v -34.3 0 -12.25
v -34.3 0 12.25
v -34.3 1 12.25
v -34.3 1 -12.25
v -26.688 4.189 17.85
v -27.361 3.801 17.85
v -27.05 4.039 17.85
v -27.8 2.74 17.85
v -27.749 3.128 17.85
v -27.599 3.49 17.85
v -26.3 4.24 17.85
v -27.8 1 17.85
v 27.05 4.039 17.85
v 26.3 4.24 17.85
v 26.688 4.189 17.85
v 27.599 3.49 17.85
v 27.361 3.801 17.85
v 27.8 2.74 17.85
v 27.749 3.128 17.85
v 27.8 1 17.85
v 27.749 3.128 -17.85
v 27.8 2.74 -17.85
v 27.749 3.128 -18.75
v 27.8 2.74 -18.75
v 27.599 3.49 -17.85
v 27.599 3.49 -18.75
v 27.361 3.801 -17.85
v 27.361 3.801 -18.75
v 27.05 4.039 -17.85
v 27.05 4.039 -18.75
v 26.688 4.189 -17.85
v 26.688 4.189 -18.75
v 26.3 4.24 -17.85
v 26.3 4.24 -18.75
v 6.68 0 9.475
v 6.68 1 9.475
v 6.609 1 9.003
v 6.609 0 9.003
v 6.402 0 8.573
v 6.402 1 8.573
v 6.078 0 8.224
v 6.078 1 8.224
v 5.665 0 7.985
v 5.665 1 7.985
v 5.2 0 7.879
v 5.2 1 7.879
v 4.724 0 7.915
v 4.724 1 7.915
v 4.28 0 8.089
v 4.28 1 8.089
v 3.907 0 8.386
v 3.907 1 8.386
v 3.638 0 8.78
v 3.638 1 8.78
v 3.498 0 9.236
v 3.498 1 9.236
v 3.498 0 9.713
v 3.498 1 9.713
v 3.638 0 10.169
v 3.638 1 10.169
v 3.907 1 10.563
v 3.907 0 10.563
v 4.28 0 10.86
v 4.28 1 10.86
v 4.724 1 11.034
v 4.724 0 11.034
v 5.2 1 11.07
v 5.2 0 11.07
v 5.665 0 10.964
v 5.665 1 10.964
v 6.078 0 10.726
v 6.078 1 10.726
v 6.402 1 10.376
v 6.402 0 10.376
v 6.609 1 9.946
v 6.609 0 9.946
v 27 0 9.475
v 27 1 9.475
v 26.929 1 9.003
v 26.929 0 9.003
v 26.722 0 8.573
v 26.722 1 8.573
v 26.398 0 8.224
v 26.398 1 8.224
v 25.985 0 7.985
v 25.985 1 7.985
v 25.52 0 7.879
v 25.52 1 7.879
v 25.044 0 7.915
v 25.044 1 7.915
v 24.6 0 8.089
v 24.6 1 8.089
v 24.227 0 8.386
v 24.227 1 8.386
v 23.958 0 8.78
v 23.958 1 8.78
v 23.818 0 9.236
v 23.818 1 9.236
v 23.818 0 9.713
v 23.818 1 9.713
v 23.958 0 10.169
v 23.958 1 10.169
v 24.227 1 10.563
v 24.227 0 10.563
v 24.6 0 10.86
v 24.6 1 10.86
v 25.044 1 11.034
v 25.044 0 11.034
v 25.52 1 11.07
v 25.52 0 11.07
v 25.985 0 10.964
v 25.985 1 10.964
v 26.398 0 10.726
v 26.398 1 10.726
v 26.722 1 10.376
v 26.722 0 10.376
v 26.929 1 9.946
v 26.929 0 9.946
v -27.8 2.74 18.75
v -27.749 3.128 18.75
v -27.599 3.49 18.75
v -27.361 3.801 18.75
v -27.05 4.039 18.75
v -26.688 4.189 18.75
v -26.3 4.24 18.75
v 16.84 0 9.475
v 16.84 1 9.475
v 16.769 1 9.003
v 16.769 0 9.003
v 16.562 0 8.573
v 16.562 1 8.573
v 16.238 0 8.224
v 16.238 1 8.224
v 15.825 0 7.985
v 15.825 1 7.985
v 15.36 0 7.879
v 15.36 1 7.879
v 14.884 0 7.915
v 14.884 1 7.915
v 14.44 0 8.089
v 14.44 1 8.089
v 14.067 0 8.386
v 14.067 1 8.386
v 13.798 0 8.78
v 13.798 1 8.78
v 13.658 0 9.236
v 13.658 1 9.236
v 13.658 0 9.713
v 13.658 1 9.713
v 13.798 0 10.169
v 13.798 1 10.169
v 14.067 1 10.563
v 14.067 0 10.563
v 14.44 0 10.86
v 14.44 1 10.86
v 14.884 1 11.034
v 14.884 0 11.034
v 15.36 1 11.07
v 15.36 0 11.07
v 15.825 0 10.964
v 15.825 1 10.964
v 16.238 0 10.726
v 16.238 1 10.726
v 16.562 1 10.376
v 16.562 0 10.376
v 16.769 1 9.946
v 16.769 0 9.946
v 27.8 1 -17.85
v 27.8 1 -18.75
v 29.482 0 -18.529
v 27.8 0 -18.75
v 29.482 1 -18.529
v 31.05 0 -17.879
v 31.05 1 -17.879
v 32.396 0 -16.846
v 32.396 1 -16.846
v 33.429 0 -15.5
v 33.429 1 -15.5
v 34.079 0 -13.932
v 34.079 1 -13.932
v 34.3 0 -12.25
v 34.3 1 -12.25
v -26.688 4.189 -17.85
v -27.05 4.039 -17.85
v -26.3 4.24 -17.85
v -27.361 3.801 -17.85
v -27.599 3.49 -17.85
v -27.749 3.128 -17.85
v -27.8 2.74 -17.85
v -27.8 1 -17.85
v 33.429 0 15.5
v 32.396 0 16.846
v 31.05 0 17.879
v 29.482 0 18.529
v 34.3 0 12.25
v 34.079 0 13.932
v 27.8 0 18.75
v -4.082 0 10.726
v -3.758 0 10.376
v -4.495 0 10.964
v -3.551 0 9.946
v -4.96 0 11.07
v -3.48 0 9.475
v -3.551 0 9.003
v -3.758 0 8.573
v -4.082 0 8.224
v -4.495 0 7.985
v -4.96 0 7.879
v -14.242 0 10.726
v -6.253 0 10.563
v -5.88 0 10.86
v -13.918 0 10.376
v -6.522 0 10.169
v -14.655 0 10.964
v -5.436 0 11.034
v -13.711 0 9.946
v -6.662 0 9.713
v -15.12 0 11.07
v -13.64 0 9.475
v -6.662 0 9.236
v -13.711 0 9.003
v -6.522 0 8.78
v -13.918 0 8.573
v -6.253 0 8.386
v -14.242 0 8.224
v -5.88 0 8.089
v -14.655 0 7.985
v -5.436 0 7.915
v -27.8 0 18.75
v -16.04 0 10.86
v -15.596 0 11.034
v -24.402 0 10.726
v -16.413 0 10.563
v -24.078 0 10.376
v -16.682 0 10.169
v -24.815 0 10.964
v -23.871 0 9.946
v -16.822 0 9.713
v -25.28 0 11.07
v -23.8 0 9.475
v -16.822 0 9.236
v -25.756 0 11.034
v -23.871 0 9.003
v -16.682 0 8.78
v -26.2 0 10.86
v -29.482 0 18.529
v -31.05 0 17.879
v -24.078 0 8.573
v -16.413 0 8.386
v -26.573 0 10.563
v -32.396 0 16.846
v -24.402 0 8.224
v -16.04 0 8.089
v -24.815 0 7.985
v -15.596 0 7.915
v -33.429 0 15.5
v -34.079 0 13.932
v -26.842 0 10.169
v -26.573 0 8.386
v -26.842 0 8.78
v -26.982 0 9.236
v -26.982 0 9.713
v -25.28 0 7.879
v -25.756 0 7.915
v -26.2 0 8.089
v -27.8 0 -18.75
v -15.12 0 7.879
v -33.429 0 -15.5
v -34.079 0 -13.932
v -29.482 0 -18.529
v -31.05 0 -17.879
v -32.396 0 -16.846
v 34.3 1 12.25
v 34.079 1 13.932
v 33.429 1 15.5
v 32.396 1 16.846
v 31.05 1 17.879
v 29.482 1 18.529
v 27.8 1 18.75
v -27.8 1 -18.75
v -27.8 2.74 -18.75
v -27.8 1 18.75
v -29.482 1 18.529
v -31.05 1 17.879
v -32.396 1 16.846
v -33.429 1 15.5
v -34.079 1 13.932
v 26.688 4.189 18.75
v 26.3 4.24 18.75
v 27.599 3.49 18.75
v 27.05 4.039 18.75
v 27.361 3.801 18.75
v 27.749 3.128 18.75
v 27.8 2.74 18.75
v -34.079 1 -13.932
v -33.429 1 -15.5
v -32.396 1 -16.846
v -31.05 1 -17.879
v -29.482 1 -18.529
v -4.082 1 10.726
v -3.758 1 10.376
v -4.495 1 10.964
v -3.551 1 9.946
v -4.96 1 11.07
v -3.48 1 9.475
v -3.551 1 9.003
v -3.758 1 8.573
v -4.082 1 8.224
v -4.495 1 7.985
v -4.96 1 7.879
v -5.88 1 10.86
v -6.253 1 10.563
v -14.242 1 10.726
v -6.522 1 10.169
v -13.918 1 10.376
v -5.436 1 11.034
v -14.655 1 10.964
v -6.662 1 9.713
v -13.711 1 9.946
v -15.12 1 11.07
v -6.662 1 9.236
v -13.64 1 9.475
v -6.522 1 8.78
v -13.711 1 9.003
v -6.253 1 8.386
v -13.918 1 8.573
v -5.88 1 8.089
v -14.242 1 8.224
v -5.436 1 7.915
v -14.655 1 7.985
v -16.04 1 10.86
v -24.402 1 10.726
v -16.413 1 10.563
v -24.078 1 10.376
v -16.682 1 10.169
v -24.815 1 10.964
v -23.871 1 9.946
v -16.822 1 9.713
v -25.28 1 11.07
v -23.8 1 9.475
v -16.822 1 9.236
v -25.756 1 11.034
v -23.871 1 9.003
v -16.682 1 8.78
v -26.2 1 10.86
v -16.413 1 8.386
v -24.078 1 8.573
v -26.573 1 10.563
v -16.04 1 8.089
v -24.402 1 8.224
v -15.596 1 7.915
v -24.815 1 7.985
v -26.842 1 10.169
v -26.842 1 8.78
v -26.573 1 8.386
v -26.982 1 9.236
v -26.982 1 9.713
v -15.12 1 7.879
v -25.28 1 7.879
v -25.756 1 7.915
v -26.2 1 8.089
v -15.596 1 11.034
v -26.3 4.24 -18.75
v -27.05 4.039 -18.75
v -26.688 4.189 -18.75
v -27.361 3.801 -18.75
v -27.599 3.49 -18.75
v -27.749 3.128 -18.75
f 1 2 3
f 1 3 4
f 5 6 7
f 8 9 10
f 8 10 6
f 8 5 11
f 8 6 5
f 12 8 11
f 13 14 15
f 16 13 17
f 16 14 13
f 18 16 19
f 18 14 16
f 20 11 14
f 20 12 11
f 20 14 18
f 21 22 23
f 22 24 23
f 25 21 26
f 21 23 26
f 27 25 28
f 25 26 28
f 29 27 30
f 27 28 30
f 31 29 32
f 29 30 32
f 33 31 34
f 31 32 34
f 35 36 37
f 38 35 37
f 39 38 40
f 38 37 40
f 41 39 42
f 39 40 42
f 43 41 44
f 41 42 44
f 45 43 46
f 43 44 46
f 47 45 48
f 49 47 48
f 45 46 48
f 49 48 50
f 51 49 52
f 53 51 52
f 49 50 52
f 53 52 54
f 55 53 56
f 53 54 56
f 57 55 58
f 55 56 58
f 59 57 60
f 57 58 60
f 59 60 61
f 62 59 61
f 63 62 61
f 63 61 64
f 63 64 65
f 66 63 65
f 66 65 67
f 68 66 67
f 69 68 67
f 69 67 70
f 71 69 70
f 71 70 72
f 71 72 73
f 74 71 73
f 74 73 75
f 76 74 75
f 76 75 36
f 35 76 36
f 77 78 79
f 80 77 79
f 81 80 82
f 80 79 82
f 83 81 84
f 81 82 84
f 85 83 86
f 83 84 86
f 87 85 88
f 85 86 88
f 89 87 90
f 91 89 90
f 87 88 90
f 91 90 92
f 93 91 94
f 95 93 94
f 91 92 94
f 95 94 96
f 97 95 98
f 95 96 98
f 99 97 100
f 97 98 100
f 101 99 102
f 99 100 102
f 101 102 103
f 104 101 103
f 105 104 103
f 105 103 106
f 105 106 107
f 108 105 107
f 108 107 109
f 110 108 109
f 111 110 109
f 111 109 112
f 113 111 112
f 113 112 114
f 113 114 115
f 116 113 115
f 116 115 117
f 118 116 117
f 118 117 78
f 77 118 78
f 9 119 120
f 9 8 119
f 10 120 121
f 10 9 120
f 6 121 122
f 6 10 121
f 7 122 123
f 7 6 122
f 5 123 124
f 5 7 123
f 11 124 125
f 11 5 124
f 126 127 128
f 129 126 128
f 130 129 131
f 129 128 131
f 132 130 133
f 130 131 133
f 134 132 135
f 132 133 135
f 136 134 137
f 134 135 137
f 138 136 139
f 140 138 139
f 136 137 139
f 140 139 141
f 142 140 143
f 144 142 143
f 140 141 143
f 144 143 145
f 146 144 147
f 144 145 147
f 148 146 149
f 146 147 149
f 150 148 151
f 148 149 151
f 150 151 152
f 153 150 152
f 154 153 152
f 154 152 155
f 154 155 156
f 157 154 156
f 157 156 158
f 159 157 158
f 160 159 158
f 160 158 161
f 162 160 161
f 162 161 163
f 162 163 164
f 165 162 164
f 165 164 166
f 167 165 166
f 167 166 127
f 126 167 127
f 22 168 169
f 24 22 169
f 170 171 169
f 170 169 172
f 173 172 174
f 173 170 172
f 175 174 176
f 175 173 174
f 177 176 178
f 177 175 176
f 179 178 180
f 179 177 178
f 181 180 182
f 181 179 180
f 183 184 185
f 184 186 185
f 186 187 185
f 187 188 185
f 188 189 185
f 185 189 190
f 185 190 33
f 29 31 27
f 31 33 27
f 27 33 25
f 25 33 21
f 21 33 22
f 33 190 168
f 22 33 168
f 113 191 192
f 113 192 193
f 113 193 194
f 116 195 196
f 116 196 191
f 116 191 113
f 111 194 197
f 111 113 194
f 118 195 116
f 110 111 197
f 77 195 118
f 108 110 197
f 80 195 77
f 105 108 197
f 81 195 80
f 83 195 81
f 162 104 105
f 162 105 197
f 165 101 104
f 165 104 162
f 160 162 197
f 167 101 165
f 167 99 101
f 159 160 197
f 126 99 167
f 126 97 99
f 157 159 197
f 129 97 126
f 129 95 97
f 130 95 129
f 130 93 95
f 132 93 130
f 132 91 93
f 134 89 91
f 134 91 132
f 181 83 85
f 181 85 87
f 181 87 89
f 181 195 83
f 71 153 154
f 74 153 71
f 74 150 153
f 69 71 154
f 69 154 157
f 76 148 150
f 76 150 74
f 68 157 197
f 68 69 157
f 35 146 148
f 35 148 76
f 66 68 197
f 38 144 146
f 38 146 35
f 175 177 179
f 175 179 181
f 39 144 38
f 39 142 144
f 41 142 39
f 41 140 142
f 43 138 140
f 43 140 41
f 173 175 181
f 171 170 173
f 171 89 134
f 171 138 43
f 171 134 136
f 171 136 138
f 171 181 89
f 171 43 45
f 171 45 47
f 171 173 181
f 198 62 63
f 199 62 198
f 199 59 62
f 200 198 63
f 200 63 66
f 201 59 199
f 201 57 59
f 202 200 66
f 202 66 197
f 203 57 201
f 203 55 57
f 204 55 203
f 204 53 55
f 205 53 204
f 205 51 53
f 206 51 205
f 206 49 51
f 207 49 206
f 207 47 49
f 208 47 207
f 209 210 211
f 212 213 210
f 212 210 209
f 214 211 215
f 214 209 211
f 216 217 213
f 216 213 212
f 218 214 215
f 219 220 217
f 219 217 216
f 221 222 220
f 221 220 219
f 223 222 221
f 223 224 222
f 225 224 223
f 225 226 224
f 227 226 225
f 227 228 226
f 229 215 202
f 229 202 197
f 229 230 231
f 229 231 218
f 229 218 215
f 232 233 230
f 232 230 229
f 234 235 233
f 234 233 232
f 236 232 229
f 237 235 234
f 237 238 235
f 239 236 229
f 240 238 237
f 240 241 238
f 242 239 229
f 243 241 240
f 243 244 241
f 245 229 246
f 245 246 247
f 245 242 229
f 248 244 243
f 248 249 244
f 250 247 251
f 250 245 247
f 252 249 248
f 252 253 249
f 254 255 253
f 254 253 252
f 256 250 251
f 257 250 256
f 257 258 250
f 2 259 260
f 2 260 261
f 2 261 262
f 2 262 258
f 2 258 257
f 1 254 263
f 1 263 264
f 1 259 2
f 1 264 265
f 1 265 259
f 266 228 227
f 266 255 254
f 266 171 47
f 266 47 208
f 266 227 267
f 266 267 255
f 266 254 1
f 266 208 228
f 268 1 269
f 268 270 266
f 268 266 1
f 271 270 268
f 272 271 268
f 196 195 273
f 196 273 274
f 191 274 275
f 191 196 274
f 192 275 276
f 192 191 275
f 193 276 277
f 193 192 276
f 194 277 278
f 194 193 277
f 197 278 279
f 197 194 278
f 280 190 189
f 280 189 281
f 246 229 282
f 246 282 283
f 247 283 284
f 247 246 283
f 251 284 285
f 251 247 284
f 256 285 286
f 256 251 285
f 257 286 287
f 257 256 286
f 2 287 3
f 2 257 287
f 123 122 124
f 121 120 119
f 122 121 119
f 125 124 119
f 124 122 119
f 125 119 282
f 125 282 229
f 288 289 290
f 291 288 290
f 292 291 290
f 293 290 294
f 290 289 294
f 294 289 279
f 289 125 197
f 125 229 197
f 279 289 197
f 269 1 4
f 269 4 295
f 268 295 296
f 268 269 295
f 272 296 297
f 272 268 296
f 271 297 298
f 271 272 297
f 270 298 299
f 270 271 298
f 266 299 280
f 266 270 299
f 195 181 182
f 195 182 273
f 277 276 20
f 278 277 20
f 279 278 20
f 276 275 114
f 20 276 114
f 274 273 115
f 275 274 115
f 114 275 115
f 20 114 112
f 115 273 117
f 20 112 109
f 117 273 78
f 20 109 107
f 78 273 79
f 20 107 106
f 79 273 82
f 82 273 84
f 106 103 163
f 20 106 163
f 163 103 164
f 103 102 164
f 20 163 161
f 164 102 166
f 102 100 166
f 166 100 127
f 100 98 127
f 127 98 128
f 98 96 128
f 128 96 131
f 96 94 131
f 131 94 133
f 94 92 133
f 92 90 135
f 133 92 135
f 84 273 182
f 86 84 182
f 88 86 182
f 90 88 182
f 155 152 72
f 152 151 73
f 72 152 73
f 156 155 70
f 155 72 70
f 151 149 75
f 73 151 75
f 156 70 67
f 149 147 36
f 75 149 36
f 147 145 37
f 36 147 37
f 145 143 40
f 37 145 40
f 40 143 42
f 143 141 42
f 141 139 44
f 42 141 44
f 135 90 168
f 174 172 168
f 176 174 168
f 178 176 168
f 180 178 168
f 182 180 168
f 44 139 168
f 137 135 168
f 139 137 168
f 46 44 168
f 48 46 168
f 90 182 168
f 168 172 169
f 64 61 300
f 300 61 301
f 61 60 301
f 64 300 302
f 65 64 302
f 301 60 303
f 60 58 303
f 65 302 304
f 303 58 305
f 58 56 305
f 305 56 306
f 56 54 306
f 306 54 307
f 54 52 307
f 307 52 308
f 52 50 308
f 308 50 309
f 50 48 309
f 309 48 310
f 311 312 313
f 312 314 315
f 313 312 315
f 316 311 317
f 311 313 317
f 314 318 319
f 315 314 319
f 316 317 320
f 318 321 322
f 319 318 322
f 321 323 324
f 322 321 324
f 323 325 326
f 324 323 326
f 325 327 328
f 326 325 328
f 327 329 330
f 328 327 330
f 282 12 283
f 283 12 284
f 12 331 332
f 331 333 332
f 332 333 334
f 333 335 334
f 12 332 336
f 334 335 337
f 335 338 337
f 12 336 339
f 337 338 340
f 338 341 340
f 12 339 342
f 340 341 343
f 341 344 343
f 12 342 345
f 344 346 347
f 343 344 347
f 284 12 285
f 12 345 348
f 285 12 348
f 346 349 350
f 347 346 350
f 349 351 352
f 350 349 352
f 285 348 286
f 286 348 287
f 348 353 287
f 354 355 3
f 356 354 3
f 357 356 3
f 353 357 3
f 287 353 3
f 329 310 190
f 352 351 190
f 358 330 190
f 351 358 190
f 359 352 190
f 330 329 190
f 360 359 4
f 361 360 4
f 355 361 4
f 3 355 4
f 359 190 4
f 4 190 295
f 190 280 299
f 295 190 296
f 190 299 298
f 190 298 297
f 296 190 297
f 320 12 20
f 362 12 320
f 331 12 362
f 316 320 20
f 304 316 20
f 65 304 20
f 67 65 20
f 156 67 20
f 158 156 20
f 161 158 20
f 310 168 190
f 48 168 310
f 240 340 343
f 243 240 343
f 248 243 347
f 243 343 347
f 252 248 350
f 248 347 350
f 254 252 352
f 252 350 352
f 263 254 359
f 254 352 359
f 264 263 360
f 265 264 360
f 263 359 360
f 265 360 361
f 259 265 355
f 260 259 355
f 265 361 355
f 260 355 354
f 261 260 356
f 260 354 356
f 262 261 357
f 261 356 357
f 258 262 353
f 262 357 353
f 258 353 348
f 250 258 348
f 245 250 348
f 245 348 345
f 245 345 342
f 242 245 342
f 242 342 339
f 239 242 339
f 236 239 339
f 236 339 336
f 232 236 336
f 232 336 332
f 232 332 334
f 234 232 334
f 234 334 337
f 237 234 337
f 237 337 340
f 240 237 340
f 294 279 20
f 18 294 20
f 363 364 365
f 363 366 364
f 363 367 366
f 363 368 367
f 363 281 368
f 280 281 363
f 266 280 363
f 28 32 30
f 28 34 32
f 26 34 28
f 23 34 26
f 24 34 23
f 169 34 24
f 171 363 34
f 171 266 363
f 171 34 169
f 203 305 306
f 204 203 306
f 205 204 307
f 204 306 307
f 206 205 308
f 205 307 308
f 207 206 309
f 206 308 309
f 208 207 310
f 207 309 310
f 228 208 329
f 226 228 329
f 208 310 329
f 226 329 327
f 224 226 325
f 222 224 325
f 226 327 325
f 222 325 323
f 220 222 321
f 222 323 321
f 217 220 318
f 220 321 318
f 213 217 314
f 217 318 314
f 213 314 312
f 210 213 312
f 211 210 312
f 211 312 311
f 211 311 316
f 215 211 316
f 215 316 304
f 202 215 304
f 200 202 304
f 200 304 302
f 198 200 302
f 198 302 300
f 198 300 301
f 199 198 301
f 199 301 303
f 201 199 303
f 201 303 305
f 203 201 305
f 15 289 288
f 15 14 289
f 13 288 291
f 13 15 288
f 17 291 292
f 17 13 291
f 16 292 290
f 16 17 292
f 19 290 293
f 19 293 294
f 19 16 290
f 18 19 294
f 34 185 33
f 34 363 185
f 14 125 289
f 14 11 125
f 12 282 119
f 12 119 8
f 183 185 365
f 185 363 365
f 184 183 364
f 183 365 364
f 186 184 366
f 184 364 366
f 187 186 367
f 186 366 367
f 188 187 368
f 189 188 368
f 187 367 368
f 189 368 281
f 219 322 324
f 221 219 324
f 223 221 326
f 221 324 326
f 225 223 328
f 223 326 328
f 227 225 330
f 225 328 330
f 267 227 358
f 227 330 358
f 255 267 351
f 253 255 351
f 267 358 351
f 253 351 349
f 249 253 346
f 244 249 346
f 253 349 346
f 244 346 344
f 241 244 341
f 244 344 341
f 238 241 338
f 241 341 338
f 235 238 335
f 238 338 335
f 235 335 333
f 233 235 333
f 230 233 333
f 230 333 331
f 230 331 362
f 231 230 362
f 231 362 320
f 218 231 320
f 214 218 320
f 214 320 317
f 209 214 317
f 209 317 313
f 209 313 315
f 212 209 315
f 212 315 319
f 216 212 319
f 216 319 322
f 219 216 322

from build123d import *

# Parameters (mm, degrees)
BOSS_EXTRUDE1_DEPTH = 1
SKETCH3_W           = 55.6
SKETCH3_H           = 0.9
BOSS_EXTRUDE2_DEPTH = 3.24
FILLET1_R           = 1.5
FILLET2_R           = 1.5
FILLET3_R           = 1.5
FILLET4_R           = 1.5
CUT_EXTRUDE2_REACH  = 3
SKETCH5_R           = 1.6


with BuildPart() as part:
    # Sketch1 → Boss-Extrude1 (new body)
    with BuildSketch(Plane(origin=(0, 0, 0), x_dir=(1, 0, 0), z_dir=(0, 1, 0))):
        with BuildLine():
            Line((27.8, -18.75), (-27.8, -18.75))
            ThreePointArc((-27.8, -18.75), (-32.396194078, -16.846194078), (-34.3, -12.25))
            Line((-34.3, -12.25), (-34.3, 12.25))
            ThreePointArc((-34.3, 12.25), (-32.396194078, 16.846194078), (-27.8, 18.75))
            Line((-27.8, 18.75), (27.8, 18.75))
            ThreePointArc((27.8, 18.75), (32.396194078, 16.846194078), (34.3, 12.25))
            Line((34.3, 12.25), (34.3, -12.25))
            ThreePointArc((34.3, -12.25), (32.396194078, -16.846194078), (27.8, -18.75))
        make_face()
    extrude(amount=BOSS_EXTRUDE1_DEPTH)

    # Sketch3 → Boss-Extrude2 (add)
    with BuildSketch(Plane(origin=(0, 1, 0), x_dir=(1, 0, 0), z_dir=(0, 1, 0))):
        with Locations((0, -18.3)):
            Rectangle(SKETCH3_W, SKETCH3_H)
        with Locations((0, 18.3)):
            Rectangle(SKETCH3_W, SKETCH3_H)
    extrude(amount=BOSS_EXTRUDE2_DEPTH)

    # Fillet1
    fillet1_edges = [part.edges().sort_by_distance(p)[0] for p in [
        (-27.8, 4.24, 18.3),
    ]]
    fillet(fillet1_edges, radius=FILLET1_R)

    # Fillet2
    fillet2_edges = [part.edges().sort_by_distance(p)[0] for p in [
        (27.8, 4.24, 18.3),
    ]]
    fillet(fillet2_edges, radius=FILLET2_R)

    # Fillet3
    fillet3_edges = [part.edges().sort_by_distance(p)[0] for p in [
        (27.8, 4.24, -18.3),
    ]]
    fillet(fillet3_edges, radius=FILLET3_R)

    # Fillet4
    fillet4_edges = [part.edges().sort_by_distance(p)[0] for p in [
        (-27.8, 4.24, -18.3),
    ]]
    fillet(fillet4_edges, radius=FILLET4_R)

    # Sketch5 → Cut-Extrude2 (cut, up to next)
    with BuildSketch(Plane(origin=(0, 1, 0), x_dir=(1, 0, 0), z_dir=(0, 1, 0)), mode=Mode.PRIVATE) as cut_extrude2_sk1:
        with Locations((-25.4, -9.4746)):
            Circle(SKETCH5_R)
    cut_extrude2_tool1 = extrude(cut_extrude2_sk1.sketch, amount=-CUT_EXTRUDE2_REACH, mode=Mode.PRIVATE) & part.part
    add(cut_extrude2_tool1.solids().sort_by_distance((-25.4, 1, 9.4746))[0], mode=Mode.SUBTRACT)
    # Sketch5 → Cut-Extrude2 (cut, up to next)
    with BuildSketch(Plane(origin=(0, 1, 0), x_dir=(1, 0, 0), z_dir=(0, 1, 0)), mode=Mode.PRIVATE) as cut_extrude2_sk2:
        with Locations((-15.24, -9.4746)):
            Circle(SKETCH5_R)
    cut_extrude2_tool2 = extrude(cut_extrude2_sk2.sketch, amount=-CUT_EXTRUDE2_REACH, mode=Mode.PRIVATE) & part.part
    add(cut_extrude2_tool2.solids().sort_by_distance((-15.24, 1, 9.4746))[0], mode=Mode.SUBTRACT)
    # Sketch5 → Cut-Extrude2 (cut, up to next)
    with BuildSketch(Plane(origin=(0, 1, 0), x_dir=(1, 0, 0), z_dir=(0, 1, 0)), mode=Mode.PRIVATE) as cut_extrude2_sk3:
        with Locations((-5.08, -9.4746)):
            Circle(SKETCH5_R)
    cut_extrude2_tool3 = extrude(cut_extrude2_sk3.sketch, amount=-CUT_EXTRUDE2_REACH, mode=Mode.PRIVATE) & part.part
    add(cut_extrude2_tool3.solids().sort_by_distance((-5.08, 1, 9.4746))[0], mode=Mode.SUBTRACT)
    # Sketch5 → Cut-Extrude2 (cut, up to next)
    with BuildSketch(Plane(origin=(0, 1, 0), x_dir=(1, 0, 0), z_dir=(0, 1, 0)), mode=Mode.PRIVATE) as cut_extrude2_sk4:
        with Locations((5.08, -9.4746)):
            Circle(SKETCH5_R)
    cut_extrude2_tool4 = extrude(cut_extrude2_sk4.sketch, amount=-CUT_EXTRUDE2_REACH, mode=Mode.PRIVATE) & part.part
    add(cut_extrude2_tool4.solids().sort_by_distance((5.08, 1, 9.4746))[0], mode=Mode.SUBTRACT)
    # Sketch5 → Cut-Extrude2 (cut, up to next)
    with BuildSketch(Plane(origin=(0, 1, 0), x_dir=(1, 0, 0), z_dir=(0, 1, 0)), mode=Mode.PRIVATE) as cut_extrude2_sk5:
        with Locations((15.24, -9.4746)):
            Circle(SKETCH5_R)
    cut_extrude2_tool5 = extrude(cut_extrude2_sk5.sketch, amount=-CUT_EXTRUDE2_REACH, mode=Mode.PRIVATE) & part.part
    add(cut_extrude2_tool5.solids().sort_by_distance((15.24, 1, 9.4746))[0], mode=Mode.SUBTRACT)
    # Sketch5 → Cut-Extrude2 (cut, up to next)
    with BuildSketch(Plane(origin=(0, 1, 0), x_dir=(1, 0, 0), z_dir=(0, 1, 0)), mode=Mode.PRIVATE) as cut_extrude2_sk6:
        with Locations((25.4, -9.4746)):
            Circle(SKETCH5_R)
    cut_extrude2_tool6 = extrude(cut_extrude2_sk6.sketch, amount=-CUT_EXTRUDE2_REACH, mode=Mode.PRIVATE) & part.part
    add(cut_extrude2_tool6.solids().sort_by_distance((25.4, 1, 9.4746))[0], mode=Mode.SUBTRACT)


solid = part.part
